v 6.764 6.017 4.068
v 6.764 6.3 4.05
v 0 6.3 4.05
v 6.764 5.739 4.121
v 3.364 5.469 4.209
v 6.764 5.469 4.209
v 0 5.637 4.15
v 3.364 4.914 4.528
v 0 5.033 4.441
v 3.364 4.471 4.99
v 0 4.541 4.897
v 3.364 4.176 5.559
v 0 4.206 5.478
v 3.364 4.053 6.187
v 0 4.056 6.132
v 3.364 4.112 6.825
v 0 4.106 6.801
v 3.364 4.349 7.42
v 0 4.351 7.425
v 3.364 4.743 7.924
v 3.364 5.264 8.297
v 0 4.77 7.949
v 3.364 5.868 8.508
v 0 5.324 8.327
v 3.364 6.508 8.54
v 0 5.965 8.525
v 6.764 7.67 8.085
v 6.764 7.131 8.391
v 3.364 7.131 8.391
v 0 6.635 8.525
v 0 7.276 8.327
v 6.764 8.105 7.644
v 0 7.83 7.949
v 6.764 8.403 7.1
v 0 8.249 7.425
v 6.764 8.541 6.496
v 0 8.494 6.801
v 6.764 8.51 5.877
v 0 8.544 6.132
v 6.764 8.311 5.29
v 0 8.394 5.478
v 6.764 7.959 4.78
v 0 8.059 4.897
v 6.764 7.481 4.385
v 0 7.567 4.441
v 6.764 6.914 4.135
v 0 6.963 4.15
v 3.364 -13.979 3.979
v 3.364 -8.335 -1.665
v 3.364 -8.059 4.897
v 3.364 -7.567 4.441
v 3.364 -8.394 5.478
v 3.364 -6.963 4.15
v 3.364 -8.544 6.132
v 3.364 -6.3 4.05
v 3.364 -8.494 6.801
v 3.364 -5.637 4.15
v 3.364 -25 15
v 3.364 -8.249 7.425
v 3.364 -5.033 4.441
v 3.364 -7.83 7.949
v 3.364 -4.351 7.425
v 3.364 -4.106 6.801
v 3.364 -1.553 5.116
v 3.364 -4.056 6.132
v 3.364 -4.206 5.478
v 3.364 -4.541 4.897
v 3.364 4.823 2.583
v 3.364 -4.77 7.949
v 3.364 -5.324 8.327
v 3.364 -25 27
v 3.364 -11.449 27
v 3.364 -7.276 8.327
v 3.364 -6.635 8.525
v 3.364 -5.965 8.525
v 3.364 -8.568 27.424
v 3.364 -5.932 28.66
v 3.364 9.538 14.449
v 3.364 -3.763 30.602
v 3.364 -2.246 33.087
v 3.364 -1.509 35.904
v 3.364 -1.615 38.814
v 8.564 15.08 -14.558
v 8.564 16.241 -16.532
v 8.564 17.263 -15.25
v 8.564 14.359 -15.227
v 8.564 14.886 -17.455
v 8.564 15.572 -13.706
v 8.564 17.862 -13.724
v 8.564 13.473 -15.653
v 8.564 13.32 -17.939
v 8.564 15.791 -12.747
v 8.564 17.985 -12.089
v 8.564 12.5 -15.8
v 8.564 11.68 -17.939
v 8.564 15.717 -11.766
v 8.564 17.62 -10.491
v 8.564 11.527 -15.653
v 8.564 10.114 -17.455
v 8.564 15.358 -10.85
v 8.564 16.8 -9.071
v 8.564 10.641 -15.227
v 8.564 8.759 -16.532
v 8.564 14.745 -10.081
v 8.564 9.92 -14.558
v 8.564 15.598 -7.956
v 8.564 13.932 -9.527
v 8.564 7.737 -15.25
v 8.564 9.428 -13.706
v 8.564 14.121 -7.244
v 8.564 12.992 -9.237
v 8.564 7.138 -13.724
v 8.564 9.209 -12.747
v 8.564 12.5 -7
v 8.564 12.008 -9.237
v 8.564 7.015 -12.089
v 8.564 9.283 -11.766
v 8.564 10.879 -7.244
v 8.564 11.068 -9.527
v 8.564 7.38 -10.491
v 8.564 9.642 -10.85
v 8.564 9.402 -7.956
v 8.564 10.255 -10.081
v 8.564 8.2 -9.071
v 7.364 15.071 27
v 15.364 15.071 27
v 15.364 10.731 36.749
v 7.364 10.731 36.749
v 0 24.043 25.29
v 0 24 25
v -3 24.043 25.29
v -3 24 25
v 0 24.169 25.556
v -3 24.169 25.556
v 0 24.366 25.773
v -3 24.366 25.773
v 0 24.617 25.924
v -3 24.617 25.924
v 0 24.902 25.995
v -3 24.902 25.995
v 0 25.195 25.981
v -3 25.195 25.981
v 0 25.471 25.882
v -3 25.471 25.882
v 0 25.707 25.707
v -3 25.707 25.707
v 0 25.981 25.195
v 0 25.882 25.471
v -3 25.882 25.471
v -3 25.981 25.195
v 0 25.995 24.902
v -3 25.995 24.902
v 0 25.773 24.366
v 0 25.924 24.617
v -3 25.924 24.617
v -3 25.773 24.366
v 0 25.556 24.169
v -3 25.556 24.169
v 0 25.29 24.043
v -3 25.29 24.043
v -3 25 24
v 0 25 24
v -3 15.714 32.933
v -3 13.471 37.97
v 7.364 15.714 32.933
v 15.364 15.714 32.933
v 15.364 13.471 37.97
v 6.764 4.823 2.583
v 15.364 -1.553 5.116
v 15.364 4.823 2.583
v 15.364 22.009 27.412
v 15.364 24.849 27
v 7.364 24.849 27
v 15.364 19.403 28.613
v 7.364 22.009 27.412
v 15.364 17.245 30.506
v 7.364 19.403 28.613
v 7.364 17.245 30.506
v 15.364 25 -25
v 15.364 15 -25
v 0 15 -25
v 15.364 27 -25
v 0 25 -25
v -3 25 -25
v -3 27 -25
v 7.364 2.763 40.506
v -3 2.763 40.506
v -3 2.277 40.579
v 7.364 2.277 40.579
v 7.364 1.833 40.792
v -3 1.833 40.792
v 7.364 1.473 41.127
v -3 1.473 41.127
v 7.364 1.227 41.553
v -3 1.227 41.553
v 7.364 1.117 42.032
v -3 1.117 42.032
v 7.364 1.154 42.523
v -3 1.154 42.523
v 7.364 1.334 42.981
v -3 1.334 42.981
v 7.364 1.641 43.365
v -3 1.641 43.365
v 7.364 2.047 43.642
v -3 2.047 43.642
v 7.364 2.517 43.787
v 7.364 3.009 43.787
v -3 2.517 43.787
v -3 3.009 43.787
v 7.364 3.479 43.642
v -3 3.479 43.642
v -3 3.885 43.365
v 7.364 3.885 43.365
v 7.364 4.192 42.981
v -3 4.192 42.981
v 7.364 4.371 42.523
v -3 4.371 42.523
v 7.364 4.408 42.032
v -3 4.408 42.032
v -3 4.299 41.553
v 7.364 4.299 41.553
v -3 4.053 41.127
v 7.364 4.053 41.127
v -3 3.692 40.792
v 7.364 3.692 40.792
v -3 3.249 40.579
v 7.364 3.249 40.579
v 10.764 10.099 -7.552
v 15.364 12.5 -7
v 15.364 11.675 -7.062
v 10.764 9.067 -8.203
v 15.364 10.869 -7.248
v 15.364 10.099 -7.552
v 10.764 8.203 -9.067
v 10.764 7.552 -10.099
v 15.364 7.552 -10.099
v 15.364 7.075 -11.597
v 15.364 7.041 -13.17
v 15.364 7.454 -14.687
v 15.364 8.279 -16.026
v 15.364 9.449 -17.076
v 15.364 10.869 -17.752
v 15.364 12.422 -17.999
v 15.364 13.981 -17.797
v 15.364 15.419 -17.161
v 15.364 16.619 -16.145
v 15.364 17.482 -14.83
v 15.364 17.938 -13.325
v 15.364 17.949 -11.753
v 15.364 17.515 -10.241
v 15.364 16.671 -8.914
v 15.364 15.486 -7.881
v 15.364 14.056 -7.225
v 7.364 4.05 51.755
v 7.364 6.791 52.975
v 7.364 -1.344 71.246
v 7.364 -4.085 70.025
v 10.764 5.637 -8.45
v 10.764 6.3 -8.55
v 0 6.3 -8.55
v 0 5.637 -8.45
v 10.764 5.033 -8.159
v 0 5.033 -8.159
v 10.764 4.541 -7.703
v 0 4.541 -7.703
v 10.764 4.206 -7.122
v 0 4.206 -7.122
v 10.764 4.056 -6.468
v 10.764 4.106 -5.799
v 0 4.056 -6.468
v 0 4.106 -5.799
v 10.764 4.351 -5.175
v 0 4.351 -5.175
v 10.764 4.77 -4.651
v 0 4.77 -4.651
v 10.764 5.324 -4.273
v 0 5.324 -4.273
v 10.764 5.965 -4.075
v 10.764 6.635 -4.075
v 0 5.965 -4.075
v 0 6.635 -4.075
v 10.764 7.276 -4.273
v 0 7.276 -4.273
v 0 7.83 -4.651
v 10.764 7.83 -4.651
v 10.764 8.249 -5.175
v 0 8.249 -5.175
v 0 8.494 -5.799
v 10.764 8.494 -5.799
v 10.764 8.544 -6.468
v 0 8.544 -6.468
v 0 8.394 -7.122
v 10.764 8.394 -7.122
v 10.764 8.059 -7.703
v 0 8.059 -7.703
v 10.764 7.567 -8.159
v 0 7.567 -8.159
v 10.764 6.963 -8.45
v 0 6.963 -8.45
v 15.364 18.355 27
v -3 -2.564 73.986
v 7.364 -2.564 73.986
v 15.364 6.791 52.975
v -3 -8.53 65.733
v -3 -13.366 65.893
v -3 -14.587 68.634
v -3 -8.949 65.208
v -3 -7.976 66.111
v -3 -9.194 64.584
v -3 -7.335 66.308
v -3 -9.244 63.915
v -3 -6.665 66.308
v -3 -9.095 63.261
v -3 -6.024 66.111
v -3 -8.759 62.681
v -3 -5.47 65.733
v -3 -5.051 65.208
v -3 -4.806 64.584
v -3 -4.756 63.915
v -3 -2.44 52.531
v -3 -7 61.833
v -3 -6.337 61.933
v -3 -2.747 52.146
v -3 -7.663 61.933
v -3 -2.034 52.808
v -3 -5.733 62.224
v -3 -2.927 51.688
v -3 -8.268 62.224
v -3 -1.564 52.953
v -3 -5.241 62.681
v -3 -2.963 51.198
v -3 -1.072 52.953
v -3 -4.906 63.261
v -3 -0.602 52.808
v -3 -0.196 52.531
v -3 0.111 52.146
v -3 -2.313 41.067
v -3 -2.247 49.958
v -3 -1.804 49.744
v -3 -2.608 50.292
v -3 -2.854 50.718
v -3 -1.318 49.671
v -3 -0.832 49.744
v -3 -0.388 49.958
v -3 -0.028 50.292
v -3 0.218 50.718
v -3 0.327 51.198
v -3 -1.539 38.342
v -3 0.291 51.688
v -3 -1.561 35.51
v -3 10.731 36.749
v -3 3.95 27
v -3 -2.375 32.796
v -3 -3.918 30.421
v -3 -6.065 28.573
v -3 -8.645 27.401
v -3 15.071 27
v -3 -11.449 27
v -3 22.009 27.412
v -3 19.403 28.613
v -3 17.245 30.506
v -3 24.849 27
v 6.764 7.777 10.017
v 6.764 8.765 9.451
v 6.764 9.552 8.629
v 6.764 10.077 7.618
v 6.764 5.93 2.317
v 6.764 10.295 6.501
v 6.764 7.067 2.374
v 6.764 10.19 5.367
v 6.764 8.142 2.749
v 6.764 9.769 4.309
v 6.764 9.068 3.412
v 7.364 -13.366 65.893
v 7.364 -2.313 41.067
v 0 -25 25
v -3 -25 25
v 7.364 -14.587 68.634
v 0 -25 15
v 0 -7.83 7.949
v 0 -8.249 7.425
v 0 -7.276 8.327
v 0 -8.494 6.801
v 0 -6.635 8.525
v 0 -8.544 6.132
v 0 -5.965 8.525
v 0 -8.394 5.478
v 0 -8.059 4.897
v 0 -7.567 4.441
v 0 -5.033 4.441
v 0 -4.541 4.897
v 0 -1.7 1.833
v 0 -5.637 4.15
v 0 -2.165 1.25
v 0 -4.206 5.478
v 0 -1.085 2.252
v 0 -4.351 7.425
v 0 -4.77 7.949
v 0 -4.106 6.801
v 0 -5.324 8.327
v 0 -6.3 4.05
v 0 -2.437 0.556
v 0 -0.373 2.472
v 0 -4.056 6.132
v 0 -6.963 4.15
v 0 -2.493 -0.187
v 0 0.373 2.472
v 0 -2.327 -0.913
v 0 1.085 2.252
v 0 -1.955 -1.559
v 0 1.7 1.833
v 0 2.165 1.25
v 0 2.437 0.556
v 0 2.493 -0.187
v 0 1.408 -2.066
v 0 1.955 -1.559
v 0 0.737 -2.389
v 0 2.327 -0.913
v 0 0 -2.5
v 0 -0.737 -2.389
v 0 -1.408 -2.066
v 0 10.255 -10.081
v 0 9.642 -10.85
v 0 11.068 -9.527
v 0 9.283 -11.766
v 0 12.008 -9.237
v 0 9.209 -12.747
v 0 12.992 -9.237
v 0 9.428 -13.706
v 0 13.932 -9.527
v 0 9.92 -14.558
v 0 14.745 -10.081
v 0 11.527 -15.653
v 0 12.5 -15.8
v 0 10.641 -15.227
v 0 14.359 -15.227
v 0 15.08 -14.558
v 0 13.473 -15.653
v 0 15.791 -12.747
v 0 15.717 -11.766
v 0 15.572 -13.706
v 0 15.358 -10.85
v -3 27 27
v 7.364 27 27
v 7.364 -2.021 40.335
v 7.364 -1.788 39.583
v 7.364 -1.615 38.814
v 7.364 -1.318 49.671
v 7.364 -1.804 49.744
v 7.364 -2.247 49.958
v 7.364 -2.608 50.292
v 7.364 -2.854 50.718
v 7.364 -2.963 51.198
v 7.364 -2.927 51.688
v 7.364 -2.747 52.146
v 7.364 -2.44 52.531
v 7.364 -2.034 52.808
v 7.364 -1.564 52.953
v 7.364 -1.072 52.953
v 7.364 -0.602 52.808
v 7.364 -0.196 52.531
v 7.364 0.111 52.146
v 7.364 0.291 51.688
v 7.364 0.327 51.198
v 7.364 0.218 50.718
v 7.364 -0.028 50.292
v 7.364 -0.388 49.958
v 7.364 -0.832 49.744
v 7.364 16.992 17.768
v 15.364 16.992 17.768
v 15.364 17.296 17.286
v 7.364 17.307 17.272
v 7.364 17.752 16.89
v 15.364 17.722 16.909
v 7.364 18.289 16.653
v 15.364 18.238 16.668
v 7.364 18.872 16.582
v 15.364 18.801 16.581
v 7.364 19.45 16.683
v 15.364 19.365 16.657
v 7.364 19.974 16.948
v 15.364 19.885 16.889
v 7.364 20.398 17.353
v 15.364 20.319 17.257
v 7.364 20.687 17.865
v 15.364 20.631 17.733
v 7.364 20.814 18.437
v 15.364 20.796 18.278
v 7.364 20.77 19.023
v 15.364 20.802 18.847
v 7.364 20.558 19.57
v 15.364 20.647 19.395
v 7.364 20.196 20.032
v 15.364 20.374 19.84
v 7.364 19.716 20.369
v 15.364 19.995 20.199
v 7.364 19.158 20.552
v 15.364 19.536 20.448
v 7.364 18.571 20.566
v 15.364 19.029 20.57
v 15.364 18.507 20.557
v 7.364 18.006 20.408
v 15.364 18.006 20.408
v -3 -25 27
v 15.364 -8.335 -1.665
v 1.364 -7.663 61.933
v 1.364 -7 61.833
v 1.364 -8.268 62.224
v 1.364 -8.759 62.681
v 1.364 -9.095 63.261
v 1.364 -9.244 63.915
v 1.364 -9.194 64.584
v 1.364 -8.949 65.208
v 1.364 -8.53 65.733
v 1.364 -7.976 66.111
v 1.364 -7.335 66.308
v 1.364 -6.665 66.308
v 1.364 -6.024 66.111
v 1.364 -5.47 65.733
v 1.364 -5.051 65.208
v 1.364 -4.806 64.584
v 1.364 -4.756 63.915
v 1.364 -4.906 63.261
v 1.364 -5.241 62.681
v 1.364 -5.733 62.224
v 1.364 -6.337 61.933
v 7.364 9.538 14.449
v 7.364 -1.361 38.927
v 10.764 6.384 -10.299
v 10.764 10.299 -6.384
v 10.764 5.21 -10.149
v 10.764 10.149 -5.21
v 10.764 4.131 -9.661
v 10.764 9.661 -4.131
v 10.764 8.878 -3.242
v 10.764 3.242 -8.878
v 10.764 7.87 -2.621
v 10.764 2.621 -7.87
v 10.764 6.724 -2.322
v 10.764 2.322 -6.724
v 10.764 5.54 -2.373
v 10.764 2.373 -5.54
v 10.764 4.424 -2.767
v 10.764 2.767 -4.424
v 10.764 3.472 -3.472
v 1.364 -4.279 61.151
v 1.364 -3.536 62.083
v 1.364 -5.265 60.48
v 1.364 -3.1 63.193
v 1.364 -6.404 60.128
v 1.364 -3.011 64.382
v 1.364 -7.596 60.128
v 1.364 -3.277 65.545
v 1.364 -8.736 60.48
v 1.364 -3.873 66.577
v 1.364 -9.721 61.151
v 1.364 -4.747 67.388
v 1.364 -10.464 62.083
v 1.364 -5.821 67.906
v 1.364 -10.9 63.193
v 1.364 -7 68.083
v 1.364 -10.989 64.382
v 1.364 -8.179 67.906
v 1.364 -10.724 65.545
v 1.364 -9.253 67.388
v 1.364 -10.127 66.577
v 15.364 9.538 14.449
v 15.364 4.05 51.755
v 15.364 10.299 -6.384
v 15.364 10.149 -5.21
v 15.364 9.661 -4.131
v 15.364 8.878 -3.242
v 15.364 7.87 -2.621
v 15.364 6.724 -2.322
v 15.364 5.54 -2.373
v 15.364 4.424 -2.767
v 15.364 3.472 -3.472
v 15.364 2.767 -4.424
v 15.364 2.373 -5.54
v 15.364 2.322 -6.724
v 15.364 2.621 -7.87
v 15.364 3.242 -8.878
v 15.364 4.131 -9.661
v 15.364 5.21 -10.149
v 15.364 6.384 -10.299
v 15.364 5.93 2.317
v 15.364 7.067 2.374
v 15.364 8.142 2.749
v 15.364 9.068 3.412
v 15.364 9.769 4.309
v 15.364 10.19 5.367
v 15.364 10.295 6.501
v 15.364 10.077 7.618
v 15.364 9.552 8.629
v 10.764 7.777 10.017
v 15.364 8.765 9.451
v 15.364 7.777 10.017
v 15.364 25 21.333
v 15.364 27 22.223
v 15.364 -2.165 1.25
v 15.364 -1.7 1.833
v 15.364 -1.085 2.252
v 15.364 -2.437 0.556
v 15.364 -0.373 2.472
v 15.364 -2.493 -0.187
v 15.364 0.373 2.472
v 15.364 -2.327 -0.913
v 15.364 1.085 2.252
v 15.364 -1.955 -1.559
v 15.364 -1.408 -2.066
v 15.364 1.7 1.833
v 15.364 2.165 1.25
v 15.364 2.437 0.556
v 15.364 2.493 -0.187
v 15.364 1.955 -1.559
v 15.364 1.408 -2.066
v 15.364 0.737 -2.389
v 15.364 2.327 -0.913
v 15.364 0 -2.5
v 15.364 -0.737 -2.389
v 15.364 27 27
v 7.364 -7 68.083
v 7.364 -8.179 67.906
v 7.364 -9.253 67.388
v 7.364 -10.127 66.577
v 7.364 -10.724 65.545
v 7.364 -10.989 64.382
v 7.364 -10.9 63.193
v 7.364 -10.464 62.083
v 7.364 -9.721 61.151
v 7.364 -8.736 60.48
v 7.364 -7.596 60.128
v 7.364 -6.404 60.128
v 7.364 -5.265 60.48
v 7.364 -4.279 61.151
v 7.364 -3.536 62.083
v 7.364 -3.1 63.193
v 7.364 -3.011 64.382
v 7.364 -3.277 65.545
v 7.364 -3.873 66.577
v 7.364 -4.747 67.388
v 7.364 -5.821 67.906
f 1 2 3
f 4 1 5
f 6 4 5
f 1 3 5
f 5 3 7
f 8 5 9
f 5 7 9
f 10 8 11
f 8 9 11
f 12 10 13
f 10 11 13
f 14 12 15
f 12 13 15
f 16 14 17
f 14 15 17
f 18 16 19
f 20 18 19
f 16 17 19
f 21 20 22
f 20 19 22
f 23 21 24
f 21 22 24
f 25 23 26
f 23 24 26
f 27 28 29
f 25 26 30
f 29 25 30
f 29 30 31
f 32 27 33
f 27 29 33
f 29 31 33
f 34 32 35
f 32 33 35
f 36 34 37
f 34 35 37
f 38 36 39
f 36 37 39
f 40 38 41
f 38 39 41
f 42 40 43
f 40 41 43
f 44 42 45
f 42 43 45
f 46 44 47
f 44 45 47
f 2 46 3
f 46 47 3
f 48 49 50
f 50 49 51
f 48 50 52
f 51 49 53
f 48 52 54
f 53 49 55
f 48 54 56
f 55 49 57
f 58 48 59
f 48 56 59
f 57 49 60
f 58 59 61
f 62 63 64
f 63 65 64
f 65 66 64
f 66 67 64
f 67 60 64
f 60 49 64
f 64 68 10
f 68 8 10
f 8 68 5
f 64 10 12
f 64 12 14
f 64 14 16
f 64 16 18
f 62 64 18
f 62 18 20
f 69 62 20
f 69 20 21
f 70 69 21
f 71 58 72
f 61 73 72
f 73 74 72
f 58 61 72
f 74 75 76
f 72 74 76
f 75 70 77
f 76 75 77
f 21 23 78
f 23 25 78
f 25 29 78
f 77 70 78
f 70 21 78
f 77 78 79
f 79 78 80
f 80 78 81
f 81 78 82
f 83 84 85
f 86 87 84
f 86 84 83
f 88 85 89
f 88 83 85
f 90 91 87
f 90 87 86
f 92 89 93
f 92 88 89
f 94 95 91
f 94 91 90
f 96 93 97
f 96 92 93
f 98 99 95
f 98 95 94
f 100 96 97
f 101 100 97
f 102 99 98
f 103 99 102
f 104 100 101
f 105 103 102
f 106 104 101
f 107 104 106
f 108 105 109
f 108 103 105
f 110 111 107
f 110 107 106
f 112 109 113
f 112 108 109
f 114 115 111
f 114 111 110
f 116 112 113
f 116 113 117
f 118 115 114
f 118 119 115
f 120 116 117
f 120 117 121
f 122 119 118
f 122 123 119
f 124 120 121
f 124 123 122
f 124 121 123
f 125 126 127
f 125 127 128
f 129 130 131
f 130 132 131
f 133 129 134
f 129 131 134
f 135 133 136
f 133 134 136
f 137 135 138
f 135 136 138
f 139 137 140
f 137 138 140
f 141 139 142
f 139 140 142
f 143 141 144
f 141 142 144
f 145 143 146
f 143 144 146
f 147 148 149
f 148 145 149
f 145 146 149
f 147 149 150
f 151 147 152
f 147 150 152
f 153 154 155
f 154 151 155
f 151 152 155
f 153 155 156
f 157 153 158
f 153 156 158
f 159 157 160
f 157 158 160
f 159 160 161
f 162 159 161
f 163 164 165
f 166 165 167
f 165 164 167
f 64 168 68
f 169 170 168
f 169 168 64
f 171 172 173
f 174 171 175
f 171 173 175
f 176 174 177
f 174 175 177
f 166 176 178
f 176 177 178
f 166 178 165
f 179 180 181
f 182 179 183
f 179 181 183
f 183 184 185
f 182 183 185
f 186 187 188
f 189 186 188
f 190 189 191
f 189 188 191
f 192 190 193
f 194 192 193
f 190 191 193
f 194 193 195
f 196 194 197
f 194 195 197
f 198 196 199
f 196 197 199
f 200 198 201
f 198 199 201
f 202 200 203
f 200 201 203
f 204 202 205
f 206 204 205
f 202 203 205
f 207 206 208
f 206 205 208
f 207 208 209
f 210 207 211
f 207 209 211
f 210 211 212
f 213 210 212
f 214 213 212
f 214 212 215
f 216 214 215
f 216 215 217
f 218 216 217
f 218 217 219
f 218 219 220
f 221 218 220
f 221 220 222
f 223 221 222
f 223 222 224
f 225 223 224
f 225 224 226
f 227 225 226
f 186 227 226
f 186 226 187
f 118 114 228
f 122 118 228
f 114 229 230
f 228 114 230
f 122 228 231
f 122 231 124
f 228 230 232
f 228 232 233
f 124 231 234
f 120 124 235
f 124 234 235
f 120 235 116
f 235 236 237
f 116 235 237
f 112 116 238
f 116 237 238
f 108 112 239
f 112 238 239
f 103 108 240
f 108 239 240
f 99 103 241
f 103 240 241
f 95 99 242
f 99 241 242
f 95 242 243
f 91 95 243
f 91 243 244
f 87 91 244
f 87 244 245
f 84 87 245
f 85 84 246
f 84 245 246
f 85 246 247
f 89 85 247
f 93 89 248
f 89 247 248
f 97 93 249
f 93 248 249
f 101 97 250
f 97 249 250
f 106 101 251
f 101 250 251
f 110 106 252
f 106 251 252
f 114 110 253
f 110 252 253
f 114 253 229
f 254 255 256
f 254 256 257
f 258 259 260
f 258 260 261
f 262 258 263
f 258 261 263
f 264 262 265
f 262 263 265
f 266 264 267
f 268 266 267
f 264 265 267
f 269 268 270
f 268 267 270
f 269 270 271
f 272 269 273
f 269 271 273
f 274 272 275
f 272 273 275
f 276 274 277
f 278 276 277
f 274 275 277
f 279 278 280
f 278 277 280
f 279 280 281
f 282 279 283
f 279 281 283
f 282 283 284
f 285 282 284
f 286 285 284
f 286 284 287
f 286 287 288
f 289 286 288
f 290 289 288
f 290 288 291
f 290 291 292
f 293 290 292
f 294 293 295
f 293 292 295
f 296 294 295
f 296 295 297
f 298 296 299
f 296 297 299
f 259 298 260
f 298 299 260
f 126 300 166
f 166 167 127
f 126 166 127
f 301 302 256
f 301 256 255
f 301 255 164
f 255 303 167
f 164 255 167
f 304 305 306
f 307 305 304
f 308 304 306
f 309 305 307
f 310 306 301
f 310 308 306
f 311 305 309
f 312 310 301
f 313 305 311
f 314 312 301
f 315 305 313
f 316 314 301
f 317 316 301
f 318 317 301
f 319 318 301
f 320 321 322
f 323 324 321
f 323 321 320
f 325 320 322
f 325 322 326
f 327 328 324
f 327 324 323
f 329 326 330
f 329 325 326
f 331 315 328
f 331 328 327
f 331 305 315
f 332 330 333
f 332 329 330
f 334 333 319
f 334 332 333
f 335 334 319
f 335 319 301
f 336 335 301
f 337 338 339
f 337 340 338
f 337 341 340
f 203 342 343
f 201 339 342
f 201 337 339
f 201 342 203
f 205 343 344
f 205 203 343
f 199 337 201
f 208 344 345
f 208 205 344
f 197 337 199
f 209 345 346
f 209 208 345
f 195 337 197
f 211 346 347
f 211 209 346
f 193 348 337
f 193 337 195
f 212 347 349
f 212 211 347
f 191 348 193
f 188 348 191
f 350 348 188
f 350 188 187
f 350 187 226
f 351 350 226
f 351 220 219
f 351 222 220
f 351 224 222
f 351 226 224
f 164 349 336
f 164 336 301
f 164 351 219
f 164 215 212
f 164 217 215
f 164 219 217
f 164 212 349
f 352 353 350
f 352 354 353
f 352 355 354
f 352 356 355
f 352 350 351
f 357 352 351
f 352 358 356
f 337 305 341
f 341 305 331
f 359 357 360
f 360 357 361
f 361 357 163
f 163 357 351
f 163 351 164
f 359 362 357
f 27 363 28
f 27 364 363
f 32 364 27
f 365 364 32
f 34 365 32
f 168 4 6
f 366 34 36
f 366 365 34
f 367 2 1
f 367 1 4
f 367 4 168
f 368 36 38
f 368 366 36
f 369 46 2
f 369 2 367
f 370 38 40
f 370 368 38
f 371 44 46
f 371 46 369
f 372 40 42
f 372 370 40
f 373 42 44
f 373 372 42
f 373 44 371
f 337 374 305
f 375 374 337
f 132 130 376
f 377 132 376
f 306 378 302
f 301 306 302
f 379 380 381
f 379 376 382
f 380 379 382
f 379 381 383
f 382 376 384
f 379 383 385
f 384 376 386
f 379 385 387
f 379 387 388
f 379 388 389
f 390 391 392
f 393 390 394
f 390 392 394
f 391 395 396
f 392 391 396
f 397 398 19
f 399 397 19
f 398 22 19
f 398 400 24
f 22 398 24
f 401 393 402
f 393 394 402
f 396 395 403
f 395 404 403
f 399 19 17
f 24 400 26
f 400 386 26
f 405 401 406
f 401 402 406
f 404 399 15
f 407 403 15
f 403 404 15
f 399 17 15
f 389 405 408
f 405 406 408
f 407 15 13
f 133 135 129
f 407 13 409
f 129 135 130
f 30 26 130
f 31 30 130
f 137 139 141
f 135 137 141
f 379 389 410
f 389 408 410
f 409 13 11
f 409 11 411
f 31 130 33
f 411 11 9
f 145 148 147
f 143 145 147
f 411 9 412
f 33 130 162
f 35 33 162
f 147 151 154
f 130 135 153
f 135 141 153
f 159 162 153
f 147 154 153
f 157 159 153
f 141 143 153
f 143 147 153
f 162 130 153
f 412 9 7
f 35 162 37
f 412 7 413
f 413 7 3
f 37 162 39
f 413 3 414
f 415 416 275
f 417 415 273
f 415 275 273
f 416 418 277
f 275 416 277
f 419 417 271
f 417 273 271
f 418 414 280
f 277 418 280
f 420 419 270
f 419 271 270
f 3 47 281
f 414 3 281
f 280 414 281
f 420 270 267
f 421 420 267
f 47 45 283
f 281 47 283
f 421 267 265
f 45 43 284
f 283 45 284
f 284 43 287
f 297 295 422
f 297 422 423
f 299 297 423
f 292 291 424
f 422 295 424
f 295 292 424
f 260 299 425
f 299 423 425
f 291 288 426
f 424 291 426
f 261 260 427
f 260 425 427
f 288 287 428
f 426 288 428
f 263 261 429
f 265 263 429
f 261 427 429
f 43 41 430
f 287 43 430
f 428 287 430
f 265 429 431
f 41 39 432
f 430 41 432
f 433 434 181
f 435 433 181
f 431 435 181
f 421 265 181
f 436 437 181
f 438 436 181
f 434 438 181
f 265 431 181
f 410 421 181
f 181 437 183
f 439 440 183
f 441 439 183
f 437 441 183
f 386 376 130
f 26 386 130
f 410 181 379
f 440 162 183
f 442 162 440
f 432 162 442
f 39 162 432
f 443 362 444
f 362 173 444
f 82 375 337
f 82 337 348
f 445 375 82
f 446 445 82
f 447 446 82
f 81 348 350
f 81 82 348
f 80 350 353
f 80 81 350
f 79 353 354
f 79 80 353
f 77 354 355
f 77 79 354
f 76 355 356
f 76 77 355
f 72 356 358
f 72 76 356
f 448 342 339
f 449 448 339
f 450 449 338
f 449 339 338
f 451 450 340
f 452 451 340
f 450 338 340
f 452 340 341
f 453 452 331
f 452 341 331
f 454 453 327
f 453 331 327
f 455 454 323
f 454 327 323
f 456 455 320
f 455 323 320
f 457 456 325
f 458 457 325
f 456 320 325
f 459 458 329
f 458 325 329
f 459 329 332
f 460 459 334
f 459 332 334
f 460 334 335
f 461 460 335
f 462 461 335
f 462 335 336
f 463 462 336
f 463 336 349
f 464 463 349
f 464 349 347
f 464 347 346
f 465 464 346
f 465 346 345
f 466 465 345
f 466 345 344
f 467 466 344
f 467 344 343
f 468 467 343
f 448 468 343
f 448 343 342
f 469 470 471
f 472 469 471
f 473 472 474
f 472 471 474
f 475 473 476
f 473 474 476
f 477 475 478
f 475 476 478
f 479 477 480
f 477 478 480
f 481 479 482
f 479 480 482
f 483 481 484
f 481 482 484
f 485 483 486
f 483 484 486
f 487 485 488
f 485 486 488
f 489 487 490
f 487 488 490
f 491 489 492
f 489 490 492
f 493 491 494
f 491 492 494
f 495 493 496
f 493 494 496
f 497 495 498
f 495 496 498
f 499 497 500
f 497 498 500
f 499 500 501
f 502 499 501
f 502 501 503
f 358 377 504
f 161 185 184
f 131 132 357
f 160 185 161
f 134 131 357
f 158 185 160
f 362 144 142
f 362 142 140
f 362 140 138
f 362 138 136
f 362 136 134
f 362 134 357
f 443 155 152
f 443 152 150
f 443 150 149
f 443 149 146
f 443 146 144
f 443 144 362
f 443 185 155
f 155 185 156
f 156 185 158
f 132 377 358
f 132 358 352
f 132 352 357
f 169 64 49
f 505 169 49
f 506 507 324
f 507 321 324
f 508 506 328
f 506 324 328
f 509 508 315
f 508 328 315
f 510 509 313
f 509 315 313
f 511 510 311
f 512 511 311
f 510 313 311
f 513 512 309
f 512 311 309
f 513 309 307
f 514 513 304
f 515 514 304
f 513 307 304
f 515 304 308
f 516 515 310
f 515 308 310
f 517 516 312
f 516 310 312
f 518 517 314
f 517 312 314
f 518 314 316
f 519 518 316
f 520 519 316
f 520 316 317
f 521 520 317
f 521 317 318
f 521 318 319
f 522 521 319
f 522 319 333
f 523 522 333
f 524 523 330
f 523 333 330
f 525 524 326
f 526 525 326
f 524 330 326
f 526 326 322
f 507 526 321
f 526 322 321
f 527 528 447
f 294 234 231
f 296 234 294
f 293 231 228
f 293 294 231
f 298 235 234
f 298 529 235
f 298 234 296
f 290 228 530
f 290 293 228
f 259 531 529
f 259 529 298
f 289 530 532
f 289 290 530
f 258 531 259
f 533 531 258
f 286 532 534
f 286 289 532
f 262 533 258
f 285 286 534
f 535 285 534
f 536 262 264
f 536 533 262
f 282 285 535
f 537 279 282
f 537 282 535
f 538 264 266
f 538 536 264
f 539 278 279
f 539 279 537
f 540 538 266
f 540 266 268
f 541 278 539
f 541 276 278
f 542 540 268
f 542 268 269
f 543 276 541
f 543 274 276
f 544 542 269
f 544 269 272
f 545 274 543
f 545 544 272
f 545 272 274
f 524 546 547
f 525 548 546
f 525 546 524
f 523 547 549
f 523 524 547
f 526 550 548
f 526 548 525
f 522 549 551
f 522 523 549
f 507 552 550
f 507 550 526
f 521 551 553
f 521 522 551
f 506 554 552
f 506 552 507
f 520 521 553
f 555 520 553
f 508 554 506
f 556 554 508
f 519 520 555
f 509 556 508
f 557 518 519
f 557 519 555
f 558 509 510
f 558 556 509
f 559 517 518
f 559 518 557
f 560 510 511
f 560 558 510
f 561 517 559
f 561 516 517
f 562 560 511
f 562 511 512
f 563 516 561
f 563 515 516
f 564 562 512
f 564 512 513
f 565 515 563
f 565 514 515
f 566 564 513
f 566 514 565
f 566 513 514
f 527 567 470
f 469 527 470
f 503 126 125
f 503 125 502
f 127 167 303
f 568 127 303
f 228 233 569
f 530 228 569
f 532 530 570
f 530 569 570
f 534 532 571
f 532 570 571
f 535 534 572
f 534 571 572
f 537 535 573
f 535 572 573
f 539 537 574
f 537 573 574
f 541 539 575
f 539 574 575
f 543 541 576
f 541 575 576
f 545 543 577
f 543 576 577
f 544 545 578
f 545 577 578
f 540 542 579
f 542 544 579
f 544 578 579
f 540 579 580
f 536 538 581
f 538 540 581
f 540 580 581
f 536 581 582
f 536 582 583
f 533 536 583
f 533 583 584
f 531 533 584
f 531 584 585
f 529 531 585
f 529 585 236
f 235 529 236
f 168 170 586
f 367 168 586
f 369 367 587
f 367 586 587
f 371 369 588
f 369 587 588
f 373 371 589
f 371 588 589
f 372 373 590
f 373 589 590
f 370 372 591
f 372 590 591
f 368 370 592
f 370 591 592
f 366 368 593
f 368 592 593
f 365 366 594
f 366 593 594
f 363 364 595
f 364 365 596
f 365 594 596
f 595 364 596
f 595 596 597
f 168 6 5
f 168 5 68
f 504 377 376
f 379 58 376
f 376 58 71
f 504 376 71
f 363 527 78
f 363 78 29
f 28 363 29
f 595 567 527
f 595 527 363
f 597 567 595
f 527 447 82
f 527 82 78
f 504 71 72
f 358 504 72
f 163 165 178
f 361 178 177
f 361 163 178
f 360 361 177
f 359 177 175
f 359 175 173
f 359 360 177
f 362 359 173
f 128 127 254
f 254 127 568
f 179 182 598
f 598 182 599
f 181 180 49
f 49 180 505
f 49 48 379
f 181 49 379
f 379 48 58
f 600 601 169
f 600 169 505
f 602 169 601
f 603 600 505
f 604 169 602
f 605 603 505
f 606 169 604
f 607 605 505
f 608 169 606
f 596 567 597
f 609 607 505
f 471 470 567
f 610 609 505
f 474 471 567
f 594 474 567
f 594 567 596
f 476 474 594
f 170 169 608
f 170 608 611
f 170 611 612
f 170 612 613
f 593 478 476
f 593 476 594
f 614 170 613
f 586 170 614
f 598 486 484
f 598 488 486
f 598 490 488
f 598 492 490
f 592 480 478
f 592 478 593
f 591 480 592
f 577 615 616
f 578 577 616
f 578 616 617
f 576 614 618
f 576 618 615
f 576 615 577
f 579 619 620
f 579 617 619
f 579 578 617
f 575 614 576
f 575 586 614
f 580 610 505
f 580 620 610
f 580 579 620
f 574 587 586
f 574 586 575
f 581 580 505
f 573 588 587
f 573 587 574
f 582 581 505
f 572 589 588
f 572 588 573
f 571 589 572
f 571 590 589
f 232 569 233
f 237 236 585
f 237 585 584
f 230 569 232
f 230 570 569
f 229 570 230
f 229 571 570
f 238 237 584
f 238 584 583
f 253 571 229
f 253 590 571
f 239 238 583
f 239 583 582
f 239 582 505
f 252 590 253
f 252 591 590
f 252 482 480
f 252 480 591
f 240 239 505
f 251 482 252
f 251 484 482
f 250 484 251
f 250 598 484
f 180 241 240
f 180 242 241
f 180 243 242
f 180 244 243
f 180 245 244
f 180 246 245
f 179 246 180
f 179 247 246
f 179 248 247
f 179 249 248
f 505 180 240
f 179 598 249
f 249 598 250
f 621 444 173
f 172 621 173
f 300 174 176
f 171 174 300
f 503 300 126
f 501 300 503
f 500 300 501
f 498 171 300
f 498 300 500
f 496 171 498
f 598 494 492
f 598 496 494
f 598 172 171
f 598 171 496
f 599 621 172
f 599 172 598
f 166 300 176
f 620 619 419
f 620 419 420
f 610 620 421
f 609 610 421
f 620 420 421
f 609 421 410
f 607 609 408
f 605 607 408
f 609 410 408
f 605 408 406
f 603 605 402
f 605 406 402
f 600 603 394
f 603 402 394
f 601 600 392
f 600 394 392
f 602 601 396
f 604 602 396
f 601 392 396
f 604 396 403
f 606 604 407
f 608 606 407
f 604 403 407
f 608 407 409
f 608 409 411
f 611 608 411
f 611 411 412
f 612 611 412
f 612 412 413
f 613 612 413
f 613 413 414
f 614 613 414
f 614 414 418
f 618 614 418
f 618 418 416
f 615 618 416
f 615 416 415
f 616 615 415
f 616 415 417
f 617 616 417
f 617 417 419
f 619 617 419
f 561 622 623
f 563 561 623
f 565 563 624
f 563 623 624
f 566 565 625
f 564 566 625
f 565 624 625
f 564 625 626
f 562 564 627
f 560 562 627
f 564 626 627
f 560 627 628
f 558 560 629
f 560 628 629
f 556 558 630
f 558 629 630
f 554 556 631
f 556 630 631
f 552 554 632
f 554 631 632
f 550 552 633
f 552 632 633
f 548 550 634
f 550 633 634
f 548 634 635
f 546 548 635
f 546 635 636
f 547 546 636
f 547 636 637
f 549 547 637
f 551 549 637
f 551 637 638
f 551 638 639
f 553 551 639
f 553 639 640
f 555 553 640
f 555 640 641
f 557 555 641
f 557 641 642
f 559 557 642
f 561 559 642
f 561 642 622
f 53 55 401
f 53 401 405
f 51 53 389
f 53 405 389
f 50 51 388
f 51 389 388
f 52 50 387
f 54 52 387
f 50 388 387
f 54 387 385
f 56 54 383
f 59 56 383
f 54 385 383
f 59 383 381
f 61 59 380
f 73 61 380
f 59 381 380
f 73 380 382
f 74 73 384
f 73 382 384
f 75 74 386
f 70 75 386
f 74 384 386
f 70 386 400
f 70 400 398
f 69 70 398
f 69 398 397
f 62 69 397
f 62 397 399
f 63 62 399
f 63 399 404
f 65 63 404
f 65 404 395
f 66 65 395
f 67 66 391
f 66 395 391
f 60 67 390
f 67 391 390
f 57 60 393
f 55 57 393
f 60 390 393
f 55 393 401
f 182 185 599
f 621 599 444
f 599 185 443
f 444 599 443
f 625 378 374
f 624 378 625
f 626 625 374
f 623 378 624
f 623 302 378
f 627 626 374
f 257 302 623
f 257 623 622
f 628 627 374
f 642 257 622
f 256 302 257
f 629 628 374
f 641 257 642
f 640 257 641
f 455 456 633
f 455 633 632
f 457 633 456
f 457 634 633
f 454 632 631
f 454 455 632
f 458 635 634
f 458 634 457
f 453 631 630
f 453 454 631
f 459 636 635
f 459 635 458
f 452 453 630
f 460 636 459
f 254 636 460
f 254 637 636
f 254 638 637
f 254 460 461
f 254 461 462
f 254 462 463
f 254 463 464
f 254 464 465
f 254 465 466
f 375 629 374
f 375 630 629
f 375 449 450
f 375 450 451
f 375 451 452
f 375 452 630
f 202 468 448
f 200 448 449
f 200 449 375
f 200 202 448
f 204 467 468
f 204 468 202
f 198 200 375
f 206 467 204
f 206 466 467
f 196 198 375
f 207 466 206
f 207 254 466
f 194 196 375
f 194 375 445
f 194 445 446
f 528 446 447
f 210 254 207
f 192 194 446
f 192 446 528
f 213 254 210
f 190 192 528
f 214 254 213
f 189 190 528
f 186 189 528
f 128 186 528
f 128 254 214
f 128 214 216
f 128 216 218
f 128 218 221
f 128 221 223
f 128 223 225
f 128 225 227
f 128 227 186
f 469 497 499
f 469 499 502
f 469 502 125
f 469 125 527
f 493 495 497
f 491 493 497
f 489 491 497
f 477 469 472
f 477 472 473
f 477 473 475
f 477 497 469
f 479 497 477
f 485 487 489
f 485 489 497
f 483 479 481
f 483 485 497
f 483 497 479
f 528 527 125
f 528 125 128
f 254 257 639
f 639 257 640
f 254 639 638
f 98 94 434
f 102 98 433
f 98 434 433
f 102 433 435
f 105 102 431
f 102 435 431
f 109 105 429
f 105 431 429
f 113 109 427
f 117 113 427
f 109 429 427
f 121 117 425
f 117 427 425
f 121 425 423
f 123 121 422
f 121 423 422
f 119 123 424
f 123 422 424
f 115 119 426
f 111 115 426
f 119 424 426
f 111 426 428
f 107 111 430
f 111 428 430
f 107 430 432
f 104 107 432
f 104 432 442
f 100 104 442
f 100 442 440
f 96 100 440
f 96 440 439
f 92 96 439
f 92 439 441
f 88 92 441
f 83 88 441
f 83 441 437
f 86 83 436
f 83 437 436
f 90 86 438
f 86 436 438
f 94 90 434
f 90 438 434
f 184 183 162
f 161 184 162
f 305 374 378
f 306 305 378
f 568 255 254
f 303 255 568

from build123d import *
from OCP.BRepAlgoAPI import BRepAlgoAPI_Cut
from OCP.TopTools import TopTools_ListOfShape

# Parameters (mm, degrees)
SKETCH_1_W                  = 50
SKETCH_1_H                  = 50
EXTRUDE_1_DEPTH             = 15.363798586
EXTRUDE_2_DEPTH             = 3
EXTRUDE_2_DEPTH_BACK        = 15.363799
SKETCH_3_R                  = 1
CUT_EXTRUDE_1_DEPTH         = 3
HOLE_WIZARD_M6_1_D          = 5
HOLE_WIZARD_2_D             = 4.5
HOLE_WIZARD_2_CBORE_D       = 8
HOLE_WIZARD_2_CBORE_DEPTH   = 4.6
HOLE_WIZARD_2_2_D           = 6.6
HOLE_WIZARD_2_2_CBORE_D     = 11
HOLE_WIZARD_2_2_CBORE_DEPTH = 6.8
CUT_EXTRUDE_2_DEPTH         = 43.370143954
EXTRUDE_3_DEPTH             = 18.363798591
CUT_EXTRUDE_3_DEPTH         = 8
HOLE_WIZARD_M4_1_D          = 3.3
FILLET_1_R                  = 10
EXTRUDE_4_REACH             = 79.264
CUT_EXTRUDE_6_DEPTH         = 80.437872908
SKETCH_18_W                 = 10.924413006
SKETCH_18_H                 = 26.794832497
CUT_EXTRUDE_8_DEPTH         = 80.600281663
CUT_EXTRUDE_9_DEPTH         = 3.4
CUT_EXTRUDE_11_DEPTH        = 4
CUT_EXTRUDE_12_REACH        = 82.871
CUT_EXTRUDE_13_DEPTH        = 4
EXTRUDE_7_REACH             = 68.474
FILLET_2_R                  = 10
EXTRUDE_8_DEPTH             = 8
SKETCH_27_R                 = 2.000000006
CUT_EXTRUDE_14_DEPTH        = 8
HOLE_WIZARD_4_D             = 4.5
HOLE_WIZARD_4_CBORE_D       = 8
HOLE_WIZARD_4_CBORE_DEPTH   = 6
CUT_EXTRUDE_16_DEPTH        = 8
CUT_EXTRUDE_17_DEPTH        = 20


with BuildPart() as part:
    # 草图1 → 凸台-拉伸1 (new body)
    with BuildSketch(Plane(origin=(0, 0, 0), x_dir=(0, 0, -1), z_dir=(1, 0, 0))):
        Rectangle(SKETCH_1_W, SKETCH_1_H)
    extrude(amount=EXTRUDE_1_DEPTH)

    # 草图2 → 凸台-拉伸2 (add, two sides: drawn at the far end of the back side and taken through both)
    with BuildSketch(Plane.ZY.offset(-EXTRUDE_2_DEPTH_BACK)):
        Polygon((25, 25), (25, -25), (27, -25), (27, 27), (-25, 27), (-25, 25), align=None)
    extrude(amount=EXTRUDE_2_DEPTH + EXTRUDE_2_DEPTH_BACK)

    # 草图3 → 切除-拉伸1 (cut)
    with BuildSketch(Plane.ZY.offset(3)):
        with Locations((25, 25)):
            Circle(SKETCH_3_R)
    extrude(amount=-CUT_EXTRUDE_1_DEPTH, mode=Mode.SUBTRACT)

    # M6 螺纹孔1 (through all)
    with Locations(Plane(origin=(15.363798586, 0, -3e-09), x_dir=(1.78e-10, 0, 1.0), z_dir=(1.0, 0, -1.78e-10))):
        with Locations((0, 0)):
            Hole(HOLE_WIZARD_M6_1_D / 2)

    # Hole Wizard 2 (through all)
    with Locations(Plane(origin=(15.363798585, 6.3, -6.300000003), x_dir=(1.78e-10, 0, 1.0), z_dir=(1.0, 0, -1.78e-10))):
        with Locations((0, 0), (12.6, 0), (12.6, 12.6)):
            CounterBoreHole(HOLE_WIZARD_2_D / 2, HOLE_WIZARD_2_CBORE_D / 2, HOLE_WIZARD_2_CBORE_DEPTH)

    # Hole Wizard 2 2 (through all)
    with Locations(Plane(origin=(15.363798584, 12.5, -12.500000003), x_dir=(1.78e-10, 0, 1.0), z_dir=(1.0, 0, -1.78e-10))):
        with Locations((0, 0)):
            CounterBoreHole(HOLE_WIZARD_2_2_D / 2, HOLE_WIZARD_2_2_CBORE_D / 2, HOLE_WIZARD_2_2_CBORE_DEPTH)

    # 草图10 → 切除-拉伸2 (cut, through all)
    with BuildSketch(Plane(origin=(15.363798586, 0, -3e-09), x_dir=(-1.7849582135895822e-10, 0, -1.0), z_dir=(1.0, -1.476971878251353e-15, -1.7849582135895822e-10))):
        Polygon((24.999999997, -25), (24.999999997, 15), (-15.000000003, -25), align=None)
    extrude(amount=-CUT_EXTRUDE_2_DEPTH, mode=Mode.SUBTRACT)

    # 草图11 → 凸台-拉伸3 (add)
    with BuildSketch(Plane(origin=(15.363798586, 0, -3e-09), x_dir=(-1.7849582135895822e-10, 0, -1.0), z_dir=(1.0, -1.476971878251353e-15, -1.7849582135895822e-10))):
        Polygon((-70.025418171, -4.08483629), (-65.892973878, -13.366458139), (-27.000000003, 3.949809487), (-27.000000003, 15.071314076), align=None)
    extrude(amount=-EXTRUDE_3_DEPTH)


with BuildPart() as cut_extrude_3_tool:
    # 草图16 → 切除-拉伸3 (new body)
    with BuildSketch(Plane(origin=(15.363798586, 0, -3e-09), x_dir=(-1.7849582135895822e-10, 0, -1.0), z_dir=(1.0, -1.476971878251353e-15, -1.7849582135895822e-10))):
        Polygon((-70.025418171, -4.08483629), (-65.892973878, -13.366458139), (-14.448874374, 9.53793065), (-18.581318667, 18.819552499), align=None)
    extrude(amount=-CUT_EXTRUDE_3_DEPTH)


with BuildPart() as part_1:
    add(part.part)

    # 切除-拉伸3: cut by cut_extrude_3_tool, with a tolerance
    cut_extrude_3_stock = TopTools_ListOfShape()
    cut_extrude_3_stock.Append(part_1.part.wrapped)
    cut_extrude_3_tools = TopTools_ListOfShape()
    cut_extrude_3_tools.Append(cut_extrude_3_tool.part.wrapped)
    cut_extrude_3_cut = BRepAlgoAPI_Cut()
    cut_extrude_3_cut.SetArguments(cut_extrude_3_stock)
    cut_extrude_3_cut.SetTools(cut_extrude_3_tools)
    cut_extrude_3_cut.SetFuzzyValue(0.00001)
    cut_extrude_3_cut.Build()
    add(Compound.cast(cut_extrude_3_cut.Shape()).solids(), mode=Mode.REPLACE)

    # M4 螺纹孔1 (through all)
    with Locations(Plane(origin=(15.363798596, -1.317924527, 51.321178454), x_dir=(1.78e-10, 0, 1.0), z_dir=(1.0, 0, -1.78e-10))):
        with Locations((0, 0), (-9.165601576, -4.08078874)):
            Hole(HOLE_WIZARD_M4_1_D / 2)

    # 圆角1
    # the kernel refuses this fillet: 10 mm, written as the material it adds along each edge
    with BuildSketch(Plane(origin=(45.860422684, 3.949809487, 26.999999995), x_dir=(-1.4769991523120053e-15, -1.0, -1.5279946496499765e-10), z_dir=(-1.0, 1.476971878251353e-15, 1.7849582135895822e-10))) as fillet_1_piece_1_section:
        with BuildLine():
            CenterArc((FILLET_1_R * 1.53986496356, FILLET_1_R), FILLET_1_R, 156.000000009, 114)
            Line((FILLET_1_R * 0.626319505852, FILLET_1_R * 1.40673664294), (0, 0))
            Line((0, 0), (FILLET_1_R * 1.53986496371, 0))
        make_face()
    fillet_1_piece_1 = extrude(amount=48.860422684, mode=Mode.PRIVATE)
    fillet_1_piece_1 = split(fillet_1_piece_1, bisect_by=Plane(origin=(45.860422684, 3.949809487, 26.999999995), z_dir=(-7.26021404635483e-11, -0.9135454576426073, -0.40673664307578594)), keep=Keep.TOP, mode=Mode.PRIVATE)
    fillet_1_piece_1 = split(fillet_1_piece_1, bisect_by=Plane(origin=(15.363799, 3.949809487, 26.999999995), z_dir=(-1, 0, 0)), keep=Keep.TOP, mode=Mode.PRIVATE)
    fillet_1_piece_1 = split(fillet_1_piece_1, bisect_by=Plane(origin=(7.363798591, 3.949809487, 27.000000001), z_dir=(1.0, -1.476971878251353e-15, -1.7849582135895822e-10)), keep=Keep.TOP, mode=Mode.PRIVATE)
    add(fillet_1_piece_1)
    with BuildSketch(Plane(origin=(7.363798591, 3.949809487, 27.000000001), x_dir=(-1.4769991523120053e-15, -1.0, -1.5279946496499762e-10), z_dir=(-1.0, 1.476971878251353e-15, 1.7849582135895822e-10))) as fillet_1_piece_2_section:
        with BuildLine():
            CenterArc((FILLET_1_R * 1.53986496356, FILLET_1_R), FILLET_1_R, 156.000000009, 114)
            Line((FILLET_1_R * 0.626319505852, FILLET_1_R * 1.40673664294), (0, 0))
            Line((0, 0), (FILLET_1_R * 1.53986496371, 0))
        make_face()
    fillet_1_piece_2 = extrude(amount=10.363798591, mode=Mode.PRIVATE)
    fillet_1_piece_2 = split(fillet_1_piece_2, bisect_by=Plane(origin=(7.363798591, 3.949809487, 27.000000001), z_dir=(-7.26021404635483e-11, -0.9135454576426073, -0.40673664307578594)), keep=Keep.TOP, mode=Mode.PRIVATE)
    add(fillet_1_piece_2)

    # 凸台-拉伸4: up to this face of the body (flat: up to its plane)
    extrude_4_end = Plane(part_1.part.faces().sort_by_distance((-2.999999996, 0.278812164, 45.630218613))[0])
    # 草图13 → 凸台-拉伸4 (add, up to the picked face)
    with BuildSketch(Plane(origin=(15.363798586, 0, -3e-09), x_dir=(-1.7849582135895822e-10, 0, -1.0), z_dir=(1.0, -1.476971878251353e-15, -1.7849582135895822e-10)), mode=Mode.PRIVATE) as extrude_4_sk1:
        Polygon((-70.025418171, -4.08483629), (-65.892973878, -13.366458139), (-68.633610251, -14.586668069), (-73.986264473, -2.564409846), (-37.969592965, 13.471245459), (-36.749383036, 10.730609086), align=None)
    extrude_4_tool1 = split(extrude(extrude_4_sk1.sketch, amount=-EXTRUDE_4_REACH, mode=Mode.PRIVATE), bisect_by=extrude_4_end, keep=Keep.BOTH, mode=Mode.PRIVATE)
    add(extrude_4_tool1.solids().sort_by(Axis((15.363799, 1.333576, 58.228575), (-1.0, 1.476971878251353e-15, 1.7849582135895822e-10)))[0])

    # 草图17 → 切除-拉伸6 (cut, through all)
    with BuildSketch(Plane(origin=(7.363798586, 0, -1e-09), x_dir=(-1.7849580400330225e-10, 0, -1.0), z_dir=(1.0, -1.4453333388205653e-15, -1.7849580400330225e-10))):
        Polygon((-18.581318667, 18.819552499), (-22.223488553, 27), (-27.000000003, 27), (-27.000000001, 15.071314077), align=None)
        Polygon((-65.892973878, -13.366458139), (-68.633610251, -14.586668069), (-74.397031705, -1.641811538), (-71.656395332, -0.421601609), align=None)
    extrude(amount=CUT_EXTRUDE_6_DEPTH, mode=Mode.SUBTRACT)

    # 草图18 → 切除-拉伸8 (cut, through all)
    with BuildSketch(Plane(origin=(1e-09, 13.328829097, 5.934377055), x_dir=(1.0, -6.632535563560462e-11, -2.952995089226133e-11), z_dir=(7.260214046354829e-11, 0.9135454576426073, 0.406736643075786))):
        with Locations((12.826005091, -22.717693905)):
            Rectangle(SKETCH_18_W, SKETCH_18_H)
    extrude(amount=-CUT_EXTRUDE_8_DEPTH, mode=Mode.SUBTRACT)

    # 草图21 → 切除-拉伸9 (cut)
    with BuildSketch(Plane(origin=(10.763798586, 0, -2e-09), x_dir=(-1.7849582135895822e-10, 0, -1.0), z_dir=(1.0, 0, -1.7849582135895822e-10))):
        with BuildLine():
            Line((-8.790851011, -3.170197891), (-8.035128255, -4.867578994))
            ThreePointArc((-8.035128255, -4.867578994), (-4.24452272, -5.384842553), (-6.396531162, -8.547928321))
            Line((-6.396531162, -8.547928321), (-5.640808406, -10.245309423))
            ThreePointArc((-5.640808406, -10.245309423), (-2.645818169, -4.673053428), (-8.790851011, -3.170197891))
        make_face()
    extrude(amount=-CUT_EXTRUDE_9_DEPTH, mode=Mode.SUBTRACT)

    # 草图22 → 切除-拉伸11 (cut)
    with BuildSketch(Plane(origin=(7.363798586, 0, -1e-09), x_dir=(-1.7849580400330225e-10, 0, -1.0), z_dir=(1.0, -1.4453333388205653e-15, -1.7849580400330225e-10))):
        with BuildLine():
            Line((-38.81398009, -1.614742519), (-14.448874374, 9.537930649))
            Line((-14.448874374, 9.537930649), (-3.97862792, -13.978627918))
            Line((-3.97862792, -13.978627918), (-15.000000001, -25))
            Line((-15.000000001, -25), (-27.000000001, -25))
            Line((-27.000000001, -25), (-27.000000001, -11.448840151))
            ThreePointArc((-27.000000001, -11.448840151), (-30.6023364, -3.763145619), (-38.81398009, -1.614742519))
        make_face()
    extrude(amount=-CUT_EXTRUDE_11_DEPTH, mode=Mode.SUBTRACT)

    # 切除-拉伸12: up to this face of the body (flat: up to its plane)
    cut_extrude_12_end = Plane(part_1.part.faces().sort_by_distance((3.36379859, -8.635202304, 18.67291257))[0])
    # 草图23 → 切除-拉伸12 (cut, up to the picked face)
    with BuildSketch(Plane(origin=(15.363798586, 0, -3e-09), x_dir=(-1.7849582135895822e-10, 0, -1.0), z_dir=(1.0, -1.476971878251353e-15, -1.7849582135895822e-10)), mode=Mode.PRIVATE) as cut_extrude_12_sk1:
        Polygon((-14.448874367, 9.53793065), (-6.3, 6.3), (-2.58270226, 4.822942956), (-5.116130862, -1.552916699), (1.665476218, -8.334523779), (-3.978627921, -13.978627918), align=None)
    cut_extrude_12_tool1 = split(extrude(cut_extrude_12_sk1.sketch, amount=-CUT_EXTRUDE_12_REACH, mode=Mode.PRIVATE), bisect_by=cut_extrude_12_end, keep=Keep.BOTH, mode=Mode.PRIVATE)
    add(cut_extrude_12_tool1.solids().sort_by(Axis((15.363799, -1.65036, 6.158342), (-1.0, 1.476971878251353e-15, 1.7849582135895822e-10)))[0], mode=Mode.SUBTRACT)

    # 草图24 → 切除-拉伸13 (cut)
    with BuildSketch(Plane(origin=(10.763798586, 0, -2e-09), x_dir=(-1.7849582135895822e-10, 0, -1.0), z_dir=(1.0, 0, -1.7849582135895822e-10))):
        with BuildLine():
            Line((-10.01729774, 7.777057044), (-8.390979979, 7.130844587))
            ThreePointArc((-8.390979979, 7.130844587), (-5.469155413, 8.390979979), (-4.209020021, 5.469155413))
            Line((-4.209020021, 5.469155413), (-2.58270226, 4.822942956))
            ThreePointArc((-2.58270226, 4.822942956), (-4.822942956, 10.01729774), (-10.01729774, 7.777057044))
        make_face()
    extrude(amount=-CUT_EXTRUDE_13_DEPTH, mode=Mode.SUBTRACT)

    # 凸台-拉伸7: up to this face of the body (flat: up to its plane)
    extrude_7_end = Plane(part_1.part.faces().sort_by_distance((2.181899296, 21.035657038, 27))[0])
    # 草图25 → 凸台-拉伸7 (add, up to the picked face)
    with BuildSketch(Plane(origin=(5e-09, -11.87984186, 26.682561687), x_dir=(-1.0, -6.632387866372851e-11, 1.4896587046669596e-10), z_dir=(-1.630634460720778e-10, 0.4067366430757988, -0.9135454576426015)), mode=Mode.PRIVATE) as extrude_7_sk1:
        Polygon((3.000000005, 24.75021988), (3.000000005, 27.75021988), (-15.363798588, 27.750219878), (-15.363798588, 24.750219878), (-7.363798588, 24.750219879), align=None)
    extrude_7_tool1 = split(extrude(extrude_7_sk1.sketch, amount=EXTRUDE_7_REACH, mode=Mode.PRIVATE), bisect_by=extrude_7_end, keep=Keep.BOTH, mode=Mode.PRIVATE)
    add(extrude_7_tool1.solids().sort_by(Axis((6.181899, 12.100927, 37.359488), (-1.630634460720778e-10, 0.4067366430757988, -0.9135454576426015)))[0])

    # 圆角2
    fillet_2_edges = [part_1.edges().sort_by_distance(p)[0] for p in [
        (2.181899295, 18.355222913, 27),
    ]]
    fillet(fillet_2_edges, radius=FILLET_2_R)

    # 草图26 → 凸台-拉伸8 (add)
    with BuildSketch(Plane(origin=(7.363798586, 0, -1e-09), x_dir=(-1.7849580400330225e-10, 0, -1.0), z_dir=(1.0, -1.4453333388205653e-15, -1.7849580400330225e-10))):
        with BuildLine():
            Line((-27.000000002, 18.355222913), (-27.000000001, 15.071314077))
            Line((-27.000000001, 15.071314077), (-18.58131867, 18.819552492))
            Line((-18.58131867, 18.819552492), (-22.223488553, 27))
            Line((-22.223488553, 27), (-27.000000003, 27))
            Line((-27.000000003, 27), (-27.000000002, 24.849298844))
            ThreePointArc((-27.000000002, 24.849298844), (-28.613294322, 19.402908494), (-32.932633571, 15.713844268))
            Line((-32.932633571, 15.713844268), (-27.000000002, 18.355222913))
        make_face()
    extrude(amount=EXTRUDE_8_DEPTH)

    # 草图27 → 切除-拉伸14 (cut)
    with BuildSketch(Plane(origin=(15.363798586, 0, -3e-09), x_dir=(-1.7849582135895822e-10, 0, -1.0), z_dir=(1.0, -1.476971878251353e-15, -1.7849582135895822e-10))):
        with Locations((-18.581318665, 18.819552494)):
            Circle(SKETCH_27_R)
    extrude(amount=-CUT_EXTRUDE_14_DEPTH, mode=Mode.SUBTRACT)

    # 打孔尺寸(%根据)内六角圆柱头螺钉的类型4 (through all)
    with Locations(Plane(origin=(7.363798598, -7.00003543, 64.083408499), x_dir=(1.78e-10, 0, 1.0), z_dir=(1.0, 0, -1.78e-10))):
        with Locations((0, 0)):
            CounterBoreHole(HOLE_WIZARD_4_D / 2, HOLE_WIZARD_4_CBORE_D / 2, HOLE_WIZARD_4_CBORE_DEPTH)

    # 草图31 → 切除-拉伸16 (cut)
    with BuildSketch(Plane(origin=(15.363798586, 0, -3e-09), x_dir=(-1.7849582135895822e-10, 0, -1.0), z_dir=(1.0, -1.476971878251353e-15, -1.7849582135895822e-10))):
        with BuildLine():
            Line((-38.813980091, -1.614742519), (-38.927171891, -1.360509573))
            Line((-38.927171891, -1.360509573), (-41.067366433, -2.313385575))
            ThreePointArc((-41.067366433, -2.313385575), (-39.961348471, -1.897378732), (-38.813980091, -1.614742519))
        make_face()
    extrude(amount=-CUT_EXTRUDE_16_DEPTH, mode=Mode.SUBTRACT)

    # 草图32 → 切除-拉伸17 (cut)
    with BuildSketch(Plane(origin=(1.1e-08, -26.695287236, 59.958596822), x_dir=(1.0, 6.632387744895951e-11, -1.4896586773827423e-10), z_dir=(1.6306344308544944e-10, -0.40673664307581253, 0.9135454576425954))):
        Polygon((15.363798588, 24.750219878), (15.363798606, 27.750219878), (7.363798588, 27.750219879), (7.363798588, 24.750219879), align=None)
    extrude(amount=-CUT_EXTRUDE_17_DEPTH, mode=Mode.SUBTRACT)


solid = part_1.part
